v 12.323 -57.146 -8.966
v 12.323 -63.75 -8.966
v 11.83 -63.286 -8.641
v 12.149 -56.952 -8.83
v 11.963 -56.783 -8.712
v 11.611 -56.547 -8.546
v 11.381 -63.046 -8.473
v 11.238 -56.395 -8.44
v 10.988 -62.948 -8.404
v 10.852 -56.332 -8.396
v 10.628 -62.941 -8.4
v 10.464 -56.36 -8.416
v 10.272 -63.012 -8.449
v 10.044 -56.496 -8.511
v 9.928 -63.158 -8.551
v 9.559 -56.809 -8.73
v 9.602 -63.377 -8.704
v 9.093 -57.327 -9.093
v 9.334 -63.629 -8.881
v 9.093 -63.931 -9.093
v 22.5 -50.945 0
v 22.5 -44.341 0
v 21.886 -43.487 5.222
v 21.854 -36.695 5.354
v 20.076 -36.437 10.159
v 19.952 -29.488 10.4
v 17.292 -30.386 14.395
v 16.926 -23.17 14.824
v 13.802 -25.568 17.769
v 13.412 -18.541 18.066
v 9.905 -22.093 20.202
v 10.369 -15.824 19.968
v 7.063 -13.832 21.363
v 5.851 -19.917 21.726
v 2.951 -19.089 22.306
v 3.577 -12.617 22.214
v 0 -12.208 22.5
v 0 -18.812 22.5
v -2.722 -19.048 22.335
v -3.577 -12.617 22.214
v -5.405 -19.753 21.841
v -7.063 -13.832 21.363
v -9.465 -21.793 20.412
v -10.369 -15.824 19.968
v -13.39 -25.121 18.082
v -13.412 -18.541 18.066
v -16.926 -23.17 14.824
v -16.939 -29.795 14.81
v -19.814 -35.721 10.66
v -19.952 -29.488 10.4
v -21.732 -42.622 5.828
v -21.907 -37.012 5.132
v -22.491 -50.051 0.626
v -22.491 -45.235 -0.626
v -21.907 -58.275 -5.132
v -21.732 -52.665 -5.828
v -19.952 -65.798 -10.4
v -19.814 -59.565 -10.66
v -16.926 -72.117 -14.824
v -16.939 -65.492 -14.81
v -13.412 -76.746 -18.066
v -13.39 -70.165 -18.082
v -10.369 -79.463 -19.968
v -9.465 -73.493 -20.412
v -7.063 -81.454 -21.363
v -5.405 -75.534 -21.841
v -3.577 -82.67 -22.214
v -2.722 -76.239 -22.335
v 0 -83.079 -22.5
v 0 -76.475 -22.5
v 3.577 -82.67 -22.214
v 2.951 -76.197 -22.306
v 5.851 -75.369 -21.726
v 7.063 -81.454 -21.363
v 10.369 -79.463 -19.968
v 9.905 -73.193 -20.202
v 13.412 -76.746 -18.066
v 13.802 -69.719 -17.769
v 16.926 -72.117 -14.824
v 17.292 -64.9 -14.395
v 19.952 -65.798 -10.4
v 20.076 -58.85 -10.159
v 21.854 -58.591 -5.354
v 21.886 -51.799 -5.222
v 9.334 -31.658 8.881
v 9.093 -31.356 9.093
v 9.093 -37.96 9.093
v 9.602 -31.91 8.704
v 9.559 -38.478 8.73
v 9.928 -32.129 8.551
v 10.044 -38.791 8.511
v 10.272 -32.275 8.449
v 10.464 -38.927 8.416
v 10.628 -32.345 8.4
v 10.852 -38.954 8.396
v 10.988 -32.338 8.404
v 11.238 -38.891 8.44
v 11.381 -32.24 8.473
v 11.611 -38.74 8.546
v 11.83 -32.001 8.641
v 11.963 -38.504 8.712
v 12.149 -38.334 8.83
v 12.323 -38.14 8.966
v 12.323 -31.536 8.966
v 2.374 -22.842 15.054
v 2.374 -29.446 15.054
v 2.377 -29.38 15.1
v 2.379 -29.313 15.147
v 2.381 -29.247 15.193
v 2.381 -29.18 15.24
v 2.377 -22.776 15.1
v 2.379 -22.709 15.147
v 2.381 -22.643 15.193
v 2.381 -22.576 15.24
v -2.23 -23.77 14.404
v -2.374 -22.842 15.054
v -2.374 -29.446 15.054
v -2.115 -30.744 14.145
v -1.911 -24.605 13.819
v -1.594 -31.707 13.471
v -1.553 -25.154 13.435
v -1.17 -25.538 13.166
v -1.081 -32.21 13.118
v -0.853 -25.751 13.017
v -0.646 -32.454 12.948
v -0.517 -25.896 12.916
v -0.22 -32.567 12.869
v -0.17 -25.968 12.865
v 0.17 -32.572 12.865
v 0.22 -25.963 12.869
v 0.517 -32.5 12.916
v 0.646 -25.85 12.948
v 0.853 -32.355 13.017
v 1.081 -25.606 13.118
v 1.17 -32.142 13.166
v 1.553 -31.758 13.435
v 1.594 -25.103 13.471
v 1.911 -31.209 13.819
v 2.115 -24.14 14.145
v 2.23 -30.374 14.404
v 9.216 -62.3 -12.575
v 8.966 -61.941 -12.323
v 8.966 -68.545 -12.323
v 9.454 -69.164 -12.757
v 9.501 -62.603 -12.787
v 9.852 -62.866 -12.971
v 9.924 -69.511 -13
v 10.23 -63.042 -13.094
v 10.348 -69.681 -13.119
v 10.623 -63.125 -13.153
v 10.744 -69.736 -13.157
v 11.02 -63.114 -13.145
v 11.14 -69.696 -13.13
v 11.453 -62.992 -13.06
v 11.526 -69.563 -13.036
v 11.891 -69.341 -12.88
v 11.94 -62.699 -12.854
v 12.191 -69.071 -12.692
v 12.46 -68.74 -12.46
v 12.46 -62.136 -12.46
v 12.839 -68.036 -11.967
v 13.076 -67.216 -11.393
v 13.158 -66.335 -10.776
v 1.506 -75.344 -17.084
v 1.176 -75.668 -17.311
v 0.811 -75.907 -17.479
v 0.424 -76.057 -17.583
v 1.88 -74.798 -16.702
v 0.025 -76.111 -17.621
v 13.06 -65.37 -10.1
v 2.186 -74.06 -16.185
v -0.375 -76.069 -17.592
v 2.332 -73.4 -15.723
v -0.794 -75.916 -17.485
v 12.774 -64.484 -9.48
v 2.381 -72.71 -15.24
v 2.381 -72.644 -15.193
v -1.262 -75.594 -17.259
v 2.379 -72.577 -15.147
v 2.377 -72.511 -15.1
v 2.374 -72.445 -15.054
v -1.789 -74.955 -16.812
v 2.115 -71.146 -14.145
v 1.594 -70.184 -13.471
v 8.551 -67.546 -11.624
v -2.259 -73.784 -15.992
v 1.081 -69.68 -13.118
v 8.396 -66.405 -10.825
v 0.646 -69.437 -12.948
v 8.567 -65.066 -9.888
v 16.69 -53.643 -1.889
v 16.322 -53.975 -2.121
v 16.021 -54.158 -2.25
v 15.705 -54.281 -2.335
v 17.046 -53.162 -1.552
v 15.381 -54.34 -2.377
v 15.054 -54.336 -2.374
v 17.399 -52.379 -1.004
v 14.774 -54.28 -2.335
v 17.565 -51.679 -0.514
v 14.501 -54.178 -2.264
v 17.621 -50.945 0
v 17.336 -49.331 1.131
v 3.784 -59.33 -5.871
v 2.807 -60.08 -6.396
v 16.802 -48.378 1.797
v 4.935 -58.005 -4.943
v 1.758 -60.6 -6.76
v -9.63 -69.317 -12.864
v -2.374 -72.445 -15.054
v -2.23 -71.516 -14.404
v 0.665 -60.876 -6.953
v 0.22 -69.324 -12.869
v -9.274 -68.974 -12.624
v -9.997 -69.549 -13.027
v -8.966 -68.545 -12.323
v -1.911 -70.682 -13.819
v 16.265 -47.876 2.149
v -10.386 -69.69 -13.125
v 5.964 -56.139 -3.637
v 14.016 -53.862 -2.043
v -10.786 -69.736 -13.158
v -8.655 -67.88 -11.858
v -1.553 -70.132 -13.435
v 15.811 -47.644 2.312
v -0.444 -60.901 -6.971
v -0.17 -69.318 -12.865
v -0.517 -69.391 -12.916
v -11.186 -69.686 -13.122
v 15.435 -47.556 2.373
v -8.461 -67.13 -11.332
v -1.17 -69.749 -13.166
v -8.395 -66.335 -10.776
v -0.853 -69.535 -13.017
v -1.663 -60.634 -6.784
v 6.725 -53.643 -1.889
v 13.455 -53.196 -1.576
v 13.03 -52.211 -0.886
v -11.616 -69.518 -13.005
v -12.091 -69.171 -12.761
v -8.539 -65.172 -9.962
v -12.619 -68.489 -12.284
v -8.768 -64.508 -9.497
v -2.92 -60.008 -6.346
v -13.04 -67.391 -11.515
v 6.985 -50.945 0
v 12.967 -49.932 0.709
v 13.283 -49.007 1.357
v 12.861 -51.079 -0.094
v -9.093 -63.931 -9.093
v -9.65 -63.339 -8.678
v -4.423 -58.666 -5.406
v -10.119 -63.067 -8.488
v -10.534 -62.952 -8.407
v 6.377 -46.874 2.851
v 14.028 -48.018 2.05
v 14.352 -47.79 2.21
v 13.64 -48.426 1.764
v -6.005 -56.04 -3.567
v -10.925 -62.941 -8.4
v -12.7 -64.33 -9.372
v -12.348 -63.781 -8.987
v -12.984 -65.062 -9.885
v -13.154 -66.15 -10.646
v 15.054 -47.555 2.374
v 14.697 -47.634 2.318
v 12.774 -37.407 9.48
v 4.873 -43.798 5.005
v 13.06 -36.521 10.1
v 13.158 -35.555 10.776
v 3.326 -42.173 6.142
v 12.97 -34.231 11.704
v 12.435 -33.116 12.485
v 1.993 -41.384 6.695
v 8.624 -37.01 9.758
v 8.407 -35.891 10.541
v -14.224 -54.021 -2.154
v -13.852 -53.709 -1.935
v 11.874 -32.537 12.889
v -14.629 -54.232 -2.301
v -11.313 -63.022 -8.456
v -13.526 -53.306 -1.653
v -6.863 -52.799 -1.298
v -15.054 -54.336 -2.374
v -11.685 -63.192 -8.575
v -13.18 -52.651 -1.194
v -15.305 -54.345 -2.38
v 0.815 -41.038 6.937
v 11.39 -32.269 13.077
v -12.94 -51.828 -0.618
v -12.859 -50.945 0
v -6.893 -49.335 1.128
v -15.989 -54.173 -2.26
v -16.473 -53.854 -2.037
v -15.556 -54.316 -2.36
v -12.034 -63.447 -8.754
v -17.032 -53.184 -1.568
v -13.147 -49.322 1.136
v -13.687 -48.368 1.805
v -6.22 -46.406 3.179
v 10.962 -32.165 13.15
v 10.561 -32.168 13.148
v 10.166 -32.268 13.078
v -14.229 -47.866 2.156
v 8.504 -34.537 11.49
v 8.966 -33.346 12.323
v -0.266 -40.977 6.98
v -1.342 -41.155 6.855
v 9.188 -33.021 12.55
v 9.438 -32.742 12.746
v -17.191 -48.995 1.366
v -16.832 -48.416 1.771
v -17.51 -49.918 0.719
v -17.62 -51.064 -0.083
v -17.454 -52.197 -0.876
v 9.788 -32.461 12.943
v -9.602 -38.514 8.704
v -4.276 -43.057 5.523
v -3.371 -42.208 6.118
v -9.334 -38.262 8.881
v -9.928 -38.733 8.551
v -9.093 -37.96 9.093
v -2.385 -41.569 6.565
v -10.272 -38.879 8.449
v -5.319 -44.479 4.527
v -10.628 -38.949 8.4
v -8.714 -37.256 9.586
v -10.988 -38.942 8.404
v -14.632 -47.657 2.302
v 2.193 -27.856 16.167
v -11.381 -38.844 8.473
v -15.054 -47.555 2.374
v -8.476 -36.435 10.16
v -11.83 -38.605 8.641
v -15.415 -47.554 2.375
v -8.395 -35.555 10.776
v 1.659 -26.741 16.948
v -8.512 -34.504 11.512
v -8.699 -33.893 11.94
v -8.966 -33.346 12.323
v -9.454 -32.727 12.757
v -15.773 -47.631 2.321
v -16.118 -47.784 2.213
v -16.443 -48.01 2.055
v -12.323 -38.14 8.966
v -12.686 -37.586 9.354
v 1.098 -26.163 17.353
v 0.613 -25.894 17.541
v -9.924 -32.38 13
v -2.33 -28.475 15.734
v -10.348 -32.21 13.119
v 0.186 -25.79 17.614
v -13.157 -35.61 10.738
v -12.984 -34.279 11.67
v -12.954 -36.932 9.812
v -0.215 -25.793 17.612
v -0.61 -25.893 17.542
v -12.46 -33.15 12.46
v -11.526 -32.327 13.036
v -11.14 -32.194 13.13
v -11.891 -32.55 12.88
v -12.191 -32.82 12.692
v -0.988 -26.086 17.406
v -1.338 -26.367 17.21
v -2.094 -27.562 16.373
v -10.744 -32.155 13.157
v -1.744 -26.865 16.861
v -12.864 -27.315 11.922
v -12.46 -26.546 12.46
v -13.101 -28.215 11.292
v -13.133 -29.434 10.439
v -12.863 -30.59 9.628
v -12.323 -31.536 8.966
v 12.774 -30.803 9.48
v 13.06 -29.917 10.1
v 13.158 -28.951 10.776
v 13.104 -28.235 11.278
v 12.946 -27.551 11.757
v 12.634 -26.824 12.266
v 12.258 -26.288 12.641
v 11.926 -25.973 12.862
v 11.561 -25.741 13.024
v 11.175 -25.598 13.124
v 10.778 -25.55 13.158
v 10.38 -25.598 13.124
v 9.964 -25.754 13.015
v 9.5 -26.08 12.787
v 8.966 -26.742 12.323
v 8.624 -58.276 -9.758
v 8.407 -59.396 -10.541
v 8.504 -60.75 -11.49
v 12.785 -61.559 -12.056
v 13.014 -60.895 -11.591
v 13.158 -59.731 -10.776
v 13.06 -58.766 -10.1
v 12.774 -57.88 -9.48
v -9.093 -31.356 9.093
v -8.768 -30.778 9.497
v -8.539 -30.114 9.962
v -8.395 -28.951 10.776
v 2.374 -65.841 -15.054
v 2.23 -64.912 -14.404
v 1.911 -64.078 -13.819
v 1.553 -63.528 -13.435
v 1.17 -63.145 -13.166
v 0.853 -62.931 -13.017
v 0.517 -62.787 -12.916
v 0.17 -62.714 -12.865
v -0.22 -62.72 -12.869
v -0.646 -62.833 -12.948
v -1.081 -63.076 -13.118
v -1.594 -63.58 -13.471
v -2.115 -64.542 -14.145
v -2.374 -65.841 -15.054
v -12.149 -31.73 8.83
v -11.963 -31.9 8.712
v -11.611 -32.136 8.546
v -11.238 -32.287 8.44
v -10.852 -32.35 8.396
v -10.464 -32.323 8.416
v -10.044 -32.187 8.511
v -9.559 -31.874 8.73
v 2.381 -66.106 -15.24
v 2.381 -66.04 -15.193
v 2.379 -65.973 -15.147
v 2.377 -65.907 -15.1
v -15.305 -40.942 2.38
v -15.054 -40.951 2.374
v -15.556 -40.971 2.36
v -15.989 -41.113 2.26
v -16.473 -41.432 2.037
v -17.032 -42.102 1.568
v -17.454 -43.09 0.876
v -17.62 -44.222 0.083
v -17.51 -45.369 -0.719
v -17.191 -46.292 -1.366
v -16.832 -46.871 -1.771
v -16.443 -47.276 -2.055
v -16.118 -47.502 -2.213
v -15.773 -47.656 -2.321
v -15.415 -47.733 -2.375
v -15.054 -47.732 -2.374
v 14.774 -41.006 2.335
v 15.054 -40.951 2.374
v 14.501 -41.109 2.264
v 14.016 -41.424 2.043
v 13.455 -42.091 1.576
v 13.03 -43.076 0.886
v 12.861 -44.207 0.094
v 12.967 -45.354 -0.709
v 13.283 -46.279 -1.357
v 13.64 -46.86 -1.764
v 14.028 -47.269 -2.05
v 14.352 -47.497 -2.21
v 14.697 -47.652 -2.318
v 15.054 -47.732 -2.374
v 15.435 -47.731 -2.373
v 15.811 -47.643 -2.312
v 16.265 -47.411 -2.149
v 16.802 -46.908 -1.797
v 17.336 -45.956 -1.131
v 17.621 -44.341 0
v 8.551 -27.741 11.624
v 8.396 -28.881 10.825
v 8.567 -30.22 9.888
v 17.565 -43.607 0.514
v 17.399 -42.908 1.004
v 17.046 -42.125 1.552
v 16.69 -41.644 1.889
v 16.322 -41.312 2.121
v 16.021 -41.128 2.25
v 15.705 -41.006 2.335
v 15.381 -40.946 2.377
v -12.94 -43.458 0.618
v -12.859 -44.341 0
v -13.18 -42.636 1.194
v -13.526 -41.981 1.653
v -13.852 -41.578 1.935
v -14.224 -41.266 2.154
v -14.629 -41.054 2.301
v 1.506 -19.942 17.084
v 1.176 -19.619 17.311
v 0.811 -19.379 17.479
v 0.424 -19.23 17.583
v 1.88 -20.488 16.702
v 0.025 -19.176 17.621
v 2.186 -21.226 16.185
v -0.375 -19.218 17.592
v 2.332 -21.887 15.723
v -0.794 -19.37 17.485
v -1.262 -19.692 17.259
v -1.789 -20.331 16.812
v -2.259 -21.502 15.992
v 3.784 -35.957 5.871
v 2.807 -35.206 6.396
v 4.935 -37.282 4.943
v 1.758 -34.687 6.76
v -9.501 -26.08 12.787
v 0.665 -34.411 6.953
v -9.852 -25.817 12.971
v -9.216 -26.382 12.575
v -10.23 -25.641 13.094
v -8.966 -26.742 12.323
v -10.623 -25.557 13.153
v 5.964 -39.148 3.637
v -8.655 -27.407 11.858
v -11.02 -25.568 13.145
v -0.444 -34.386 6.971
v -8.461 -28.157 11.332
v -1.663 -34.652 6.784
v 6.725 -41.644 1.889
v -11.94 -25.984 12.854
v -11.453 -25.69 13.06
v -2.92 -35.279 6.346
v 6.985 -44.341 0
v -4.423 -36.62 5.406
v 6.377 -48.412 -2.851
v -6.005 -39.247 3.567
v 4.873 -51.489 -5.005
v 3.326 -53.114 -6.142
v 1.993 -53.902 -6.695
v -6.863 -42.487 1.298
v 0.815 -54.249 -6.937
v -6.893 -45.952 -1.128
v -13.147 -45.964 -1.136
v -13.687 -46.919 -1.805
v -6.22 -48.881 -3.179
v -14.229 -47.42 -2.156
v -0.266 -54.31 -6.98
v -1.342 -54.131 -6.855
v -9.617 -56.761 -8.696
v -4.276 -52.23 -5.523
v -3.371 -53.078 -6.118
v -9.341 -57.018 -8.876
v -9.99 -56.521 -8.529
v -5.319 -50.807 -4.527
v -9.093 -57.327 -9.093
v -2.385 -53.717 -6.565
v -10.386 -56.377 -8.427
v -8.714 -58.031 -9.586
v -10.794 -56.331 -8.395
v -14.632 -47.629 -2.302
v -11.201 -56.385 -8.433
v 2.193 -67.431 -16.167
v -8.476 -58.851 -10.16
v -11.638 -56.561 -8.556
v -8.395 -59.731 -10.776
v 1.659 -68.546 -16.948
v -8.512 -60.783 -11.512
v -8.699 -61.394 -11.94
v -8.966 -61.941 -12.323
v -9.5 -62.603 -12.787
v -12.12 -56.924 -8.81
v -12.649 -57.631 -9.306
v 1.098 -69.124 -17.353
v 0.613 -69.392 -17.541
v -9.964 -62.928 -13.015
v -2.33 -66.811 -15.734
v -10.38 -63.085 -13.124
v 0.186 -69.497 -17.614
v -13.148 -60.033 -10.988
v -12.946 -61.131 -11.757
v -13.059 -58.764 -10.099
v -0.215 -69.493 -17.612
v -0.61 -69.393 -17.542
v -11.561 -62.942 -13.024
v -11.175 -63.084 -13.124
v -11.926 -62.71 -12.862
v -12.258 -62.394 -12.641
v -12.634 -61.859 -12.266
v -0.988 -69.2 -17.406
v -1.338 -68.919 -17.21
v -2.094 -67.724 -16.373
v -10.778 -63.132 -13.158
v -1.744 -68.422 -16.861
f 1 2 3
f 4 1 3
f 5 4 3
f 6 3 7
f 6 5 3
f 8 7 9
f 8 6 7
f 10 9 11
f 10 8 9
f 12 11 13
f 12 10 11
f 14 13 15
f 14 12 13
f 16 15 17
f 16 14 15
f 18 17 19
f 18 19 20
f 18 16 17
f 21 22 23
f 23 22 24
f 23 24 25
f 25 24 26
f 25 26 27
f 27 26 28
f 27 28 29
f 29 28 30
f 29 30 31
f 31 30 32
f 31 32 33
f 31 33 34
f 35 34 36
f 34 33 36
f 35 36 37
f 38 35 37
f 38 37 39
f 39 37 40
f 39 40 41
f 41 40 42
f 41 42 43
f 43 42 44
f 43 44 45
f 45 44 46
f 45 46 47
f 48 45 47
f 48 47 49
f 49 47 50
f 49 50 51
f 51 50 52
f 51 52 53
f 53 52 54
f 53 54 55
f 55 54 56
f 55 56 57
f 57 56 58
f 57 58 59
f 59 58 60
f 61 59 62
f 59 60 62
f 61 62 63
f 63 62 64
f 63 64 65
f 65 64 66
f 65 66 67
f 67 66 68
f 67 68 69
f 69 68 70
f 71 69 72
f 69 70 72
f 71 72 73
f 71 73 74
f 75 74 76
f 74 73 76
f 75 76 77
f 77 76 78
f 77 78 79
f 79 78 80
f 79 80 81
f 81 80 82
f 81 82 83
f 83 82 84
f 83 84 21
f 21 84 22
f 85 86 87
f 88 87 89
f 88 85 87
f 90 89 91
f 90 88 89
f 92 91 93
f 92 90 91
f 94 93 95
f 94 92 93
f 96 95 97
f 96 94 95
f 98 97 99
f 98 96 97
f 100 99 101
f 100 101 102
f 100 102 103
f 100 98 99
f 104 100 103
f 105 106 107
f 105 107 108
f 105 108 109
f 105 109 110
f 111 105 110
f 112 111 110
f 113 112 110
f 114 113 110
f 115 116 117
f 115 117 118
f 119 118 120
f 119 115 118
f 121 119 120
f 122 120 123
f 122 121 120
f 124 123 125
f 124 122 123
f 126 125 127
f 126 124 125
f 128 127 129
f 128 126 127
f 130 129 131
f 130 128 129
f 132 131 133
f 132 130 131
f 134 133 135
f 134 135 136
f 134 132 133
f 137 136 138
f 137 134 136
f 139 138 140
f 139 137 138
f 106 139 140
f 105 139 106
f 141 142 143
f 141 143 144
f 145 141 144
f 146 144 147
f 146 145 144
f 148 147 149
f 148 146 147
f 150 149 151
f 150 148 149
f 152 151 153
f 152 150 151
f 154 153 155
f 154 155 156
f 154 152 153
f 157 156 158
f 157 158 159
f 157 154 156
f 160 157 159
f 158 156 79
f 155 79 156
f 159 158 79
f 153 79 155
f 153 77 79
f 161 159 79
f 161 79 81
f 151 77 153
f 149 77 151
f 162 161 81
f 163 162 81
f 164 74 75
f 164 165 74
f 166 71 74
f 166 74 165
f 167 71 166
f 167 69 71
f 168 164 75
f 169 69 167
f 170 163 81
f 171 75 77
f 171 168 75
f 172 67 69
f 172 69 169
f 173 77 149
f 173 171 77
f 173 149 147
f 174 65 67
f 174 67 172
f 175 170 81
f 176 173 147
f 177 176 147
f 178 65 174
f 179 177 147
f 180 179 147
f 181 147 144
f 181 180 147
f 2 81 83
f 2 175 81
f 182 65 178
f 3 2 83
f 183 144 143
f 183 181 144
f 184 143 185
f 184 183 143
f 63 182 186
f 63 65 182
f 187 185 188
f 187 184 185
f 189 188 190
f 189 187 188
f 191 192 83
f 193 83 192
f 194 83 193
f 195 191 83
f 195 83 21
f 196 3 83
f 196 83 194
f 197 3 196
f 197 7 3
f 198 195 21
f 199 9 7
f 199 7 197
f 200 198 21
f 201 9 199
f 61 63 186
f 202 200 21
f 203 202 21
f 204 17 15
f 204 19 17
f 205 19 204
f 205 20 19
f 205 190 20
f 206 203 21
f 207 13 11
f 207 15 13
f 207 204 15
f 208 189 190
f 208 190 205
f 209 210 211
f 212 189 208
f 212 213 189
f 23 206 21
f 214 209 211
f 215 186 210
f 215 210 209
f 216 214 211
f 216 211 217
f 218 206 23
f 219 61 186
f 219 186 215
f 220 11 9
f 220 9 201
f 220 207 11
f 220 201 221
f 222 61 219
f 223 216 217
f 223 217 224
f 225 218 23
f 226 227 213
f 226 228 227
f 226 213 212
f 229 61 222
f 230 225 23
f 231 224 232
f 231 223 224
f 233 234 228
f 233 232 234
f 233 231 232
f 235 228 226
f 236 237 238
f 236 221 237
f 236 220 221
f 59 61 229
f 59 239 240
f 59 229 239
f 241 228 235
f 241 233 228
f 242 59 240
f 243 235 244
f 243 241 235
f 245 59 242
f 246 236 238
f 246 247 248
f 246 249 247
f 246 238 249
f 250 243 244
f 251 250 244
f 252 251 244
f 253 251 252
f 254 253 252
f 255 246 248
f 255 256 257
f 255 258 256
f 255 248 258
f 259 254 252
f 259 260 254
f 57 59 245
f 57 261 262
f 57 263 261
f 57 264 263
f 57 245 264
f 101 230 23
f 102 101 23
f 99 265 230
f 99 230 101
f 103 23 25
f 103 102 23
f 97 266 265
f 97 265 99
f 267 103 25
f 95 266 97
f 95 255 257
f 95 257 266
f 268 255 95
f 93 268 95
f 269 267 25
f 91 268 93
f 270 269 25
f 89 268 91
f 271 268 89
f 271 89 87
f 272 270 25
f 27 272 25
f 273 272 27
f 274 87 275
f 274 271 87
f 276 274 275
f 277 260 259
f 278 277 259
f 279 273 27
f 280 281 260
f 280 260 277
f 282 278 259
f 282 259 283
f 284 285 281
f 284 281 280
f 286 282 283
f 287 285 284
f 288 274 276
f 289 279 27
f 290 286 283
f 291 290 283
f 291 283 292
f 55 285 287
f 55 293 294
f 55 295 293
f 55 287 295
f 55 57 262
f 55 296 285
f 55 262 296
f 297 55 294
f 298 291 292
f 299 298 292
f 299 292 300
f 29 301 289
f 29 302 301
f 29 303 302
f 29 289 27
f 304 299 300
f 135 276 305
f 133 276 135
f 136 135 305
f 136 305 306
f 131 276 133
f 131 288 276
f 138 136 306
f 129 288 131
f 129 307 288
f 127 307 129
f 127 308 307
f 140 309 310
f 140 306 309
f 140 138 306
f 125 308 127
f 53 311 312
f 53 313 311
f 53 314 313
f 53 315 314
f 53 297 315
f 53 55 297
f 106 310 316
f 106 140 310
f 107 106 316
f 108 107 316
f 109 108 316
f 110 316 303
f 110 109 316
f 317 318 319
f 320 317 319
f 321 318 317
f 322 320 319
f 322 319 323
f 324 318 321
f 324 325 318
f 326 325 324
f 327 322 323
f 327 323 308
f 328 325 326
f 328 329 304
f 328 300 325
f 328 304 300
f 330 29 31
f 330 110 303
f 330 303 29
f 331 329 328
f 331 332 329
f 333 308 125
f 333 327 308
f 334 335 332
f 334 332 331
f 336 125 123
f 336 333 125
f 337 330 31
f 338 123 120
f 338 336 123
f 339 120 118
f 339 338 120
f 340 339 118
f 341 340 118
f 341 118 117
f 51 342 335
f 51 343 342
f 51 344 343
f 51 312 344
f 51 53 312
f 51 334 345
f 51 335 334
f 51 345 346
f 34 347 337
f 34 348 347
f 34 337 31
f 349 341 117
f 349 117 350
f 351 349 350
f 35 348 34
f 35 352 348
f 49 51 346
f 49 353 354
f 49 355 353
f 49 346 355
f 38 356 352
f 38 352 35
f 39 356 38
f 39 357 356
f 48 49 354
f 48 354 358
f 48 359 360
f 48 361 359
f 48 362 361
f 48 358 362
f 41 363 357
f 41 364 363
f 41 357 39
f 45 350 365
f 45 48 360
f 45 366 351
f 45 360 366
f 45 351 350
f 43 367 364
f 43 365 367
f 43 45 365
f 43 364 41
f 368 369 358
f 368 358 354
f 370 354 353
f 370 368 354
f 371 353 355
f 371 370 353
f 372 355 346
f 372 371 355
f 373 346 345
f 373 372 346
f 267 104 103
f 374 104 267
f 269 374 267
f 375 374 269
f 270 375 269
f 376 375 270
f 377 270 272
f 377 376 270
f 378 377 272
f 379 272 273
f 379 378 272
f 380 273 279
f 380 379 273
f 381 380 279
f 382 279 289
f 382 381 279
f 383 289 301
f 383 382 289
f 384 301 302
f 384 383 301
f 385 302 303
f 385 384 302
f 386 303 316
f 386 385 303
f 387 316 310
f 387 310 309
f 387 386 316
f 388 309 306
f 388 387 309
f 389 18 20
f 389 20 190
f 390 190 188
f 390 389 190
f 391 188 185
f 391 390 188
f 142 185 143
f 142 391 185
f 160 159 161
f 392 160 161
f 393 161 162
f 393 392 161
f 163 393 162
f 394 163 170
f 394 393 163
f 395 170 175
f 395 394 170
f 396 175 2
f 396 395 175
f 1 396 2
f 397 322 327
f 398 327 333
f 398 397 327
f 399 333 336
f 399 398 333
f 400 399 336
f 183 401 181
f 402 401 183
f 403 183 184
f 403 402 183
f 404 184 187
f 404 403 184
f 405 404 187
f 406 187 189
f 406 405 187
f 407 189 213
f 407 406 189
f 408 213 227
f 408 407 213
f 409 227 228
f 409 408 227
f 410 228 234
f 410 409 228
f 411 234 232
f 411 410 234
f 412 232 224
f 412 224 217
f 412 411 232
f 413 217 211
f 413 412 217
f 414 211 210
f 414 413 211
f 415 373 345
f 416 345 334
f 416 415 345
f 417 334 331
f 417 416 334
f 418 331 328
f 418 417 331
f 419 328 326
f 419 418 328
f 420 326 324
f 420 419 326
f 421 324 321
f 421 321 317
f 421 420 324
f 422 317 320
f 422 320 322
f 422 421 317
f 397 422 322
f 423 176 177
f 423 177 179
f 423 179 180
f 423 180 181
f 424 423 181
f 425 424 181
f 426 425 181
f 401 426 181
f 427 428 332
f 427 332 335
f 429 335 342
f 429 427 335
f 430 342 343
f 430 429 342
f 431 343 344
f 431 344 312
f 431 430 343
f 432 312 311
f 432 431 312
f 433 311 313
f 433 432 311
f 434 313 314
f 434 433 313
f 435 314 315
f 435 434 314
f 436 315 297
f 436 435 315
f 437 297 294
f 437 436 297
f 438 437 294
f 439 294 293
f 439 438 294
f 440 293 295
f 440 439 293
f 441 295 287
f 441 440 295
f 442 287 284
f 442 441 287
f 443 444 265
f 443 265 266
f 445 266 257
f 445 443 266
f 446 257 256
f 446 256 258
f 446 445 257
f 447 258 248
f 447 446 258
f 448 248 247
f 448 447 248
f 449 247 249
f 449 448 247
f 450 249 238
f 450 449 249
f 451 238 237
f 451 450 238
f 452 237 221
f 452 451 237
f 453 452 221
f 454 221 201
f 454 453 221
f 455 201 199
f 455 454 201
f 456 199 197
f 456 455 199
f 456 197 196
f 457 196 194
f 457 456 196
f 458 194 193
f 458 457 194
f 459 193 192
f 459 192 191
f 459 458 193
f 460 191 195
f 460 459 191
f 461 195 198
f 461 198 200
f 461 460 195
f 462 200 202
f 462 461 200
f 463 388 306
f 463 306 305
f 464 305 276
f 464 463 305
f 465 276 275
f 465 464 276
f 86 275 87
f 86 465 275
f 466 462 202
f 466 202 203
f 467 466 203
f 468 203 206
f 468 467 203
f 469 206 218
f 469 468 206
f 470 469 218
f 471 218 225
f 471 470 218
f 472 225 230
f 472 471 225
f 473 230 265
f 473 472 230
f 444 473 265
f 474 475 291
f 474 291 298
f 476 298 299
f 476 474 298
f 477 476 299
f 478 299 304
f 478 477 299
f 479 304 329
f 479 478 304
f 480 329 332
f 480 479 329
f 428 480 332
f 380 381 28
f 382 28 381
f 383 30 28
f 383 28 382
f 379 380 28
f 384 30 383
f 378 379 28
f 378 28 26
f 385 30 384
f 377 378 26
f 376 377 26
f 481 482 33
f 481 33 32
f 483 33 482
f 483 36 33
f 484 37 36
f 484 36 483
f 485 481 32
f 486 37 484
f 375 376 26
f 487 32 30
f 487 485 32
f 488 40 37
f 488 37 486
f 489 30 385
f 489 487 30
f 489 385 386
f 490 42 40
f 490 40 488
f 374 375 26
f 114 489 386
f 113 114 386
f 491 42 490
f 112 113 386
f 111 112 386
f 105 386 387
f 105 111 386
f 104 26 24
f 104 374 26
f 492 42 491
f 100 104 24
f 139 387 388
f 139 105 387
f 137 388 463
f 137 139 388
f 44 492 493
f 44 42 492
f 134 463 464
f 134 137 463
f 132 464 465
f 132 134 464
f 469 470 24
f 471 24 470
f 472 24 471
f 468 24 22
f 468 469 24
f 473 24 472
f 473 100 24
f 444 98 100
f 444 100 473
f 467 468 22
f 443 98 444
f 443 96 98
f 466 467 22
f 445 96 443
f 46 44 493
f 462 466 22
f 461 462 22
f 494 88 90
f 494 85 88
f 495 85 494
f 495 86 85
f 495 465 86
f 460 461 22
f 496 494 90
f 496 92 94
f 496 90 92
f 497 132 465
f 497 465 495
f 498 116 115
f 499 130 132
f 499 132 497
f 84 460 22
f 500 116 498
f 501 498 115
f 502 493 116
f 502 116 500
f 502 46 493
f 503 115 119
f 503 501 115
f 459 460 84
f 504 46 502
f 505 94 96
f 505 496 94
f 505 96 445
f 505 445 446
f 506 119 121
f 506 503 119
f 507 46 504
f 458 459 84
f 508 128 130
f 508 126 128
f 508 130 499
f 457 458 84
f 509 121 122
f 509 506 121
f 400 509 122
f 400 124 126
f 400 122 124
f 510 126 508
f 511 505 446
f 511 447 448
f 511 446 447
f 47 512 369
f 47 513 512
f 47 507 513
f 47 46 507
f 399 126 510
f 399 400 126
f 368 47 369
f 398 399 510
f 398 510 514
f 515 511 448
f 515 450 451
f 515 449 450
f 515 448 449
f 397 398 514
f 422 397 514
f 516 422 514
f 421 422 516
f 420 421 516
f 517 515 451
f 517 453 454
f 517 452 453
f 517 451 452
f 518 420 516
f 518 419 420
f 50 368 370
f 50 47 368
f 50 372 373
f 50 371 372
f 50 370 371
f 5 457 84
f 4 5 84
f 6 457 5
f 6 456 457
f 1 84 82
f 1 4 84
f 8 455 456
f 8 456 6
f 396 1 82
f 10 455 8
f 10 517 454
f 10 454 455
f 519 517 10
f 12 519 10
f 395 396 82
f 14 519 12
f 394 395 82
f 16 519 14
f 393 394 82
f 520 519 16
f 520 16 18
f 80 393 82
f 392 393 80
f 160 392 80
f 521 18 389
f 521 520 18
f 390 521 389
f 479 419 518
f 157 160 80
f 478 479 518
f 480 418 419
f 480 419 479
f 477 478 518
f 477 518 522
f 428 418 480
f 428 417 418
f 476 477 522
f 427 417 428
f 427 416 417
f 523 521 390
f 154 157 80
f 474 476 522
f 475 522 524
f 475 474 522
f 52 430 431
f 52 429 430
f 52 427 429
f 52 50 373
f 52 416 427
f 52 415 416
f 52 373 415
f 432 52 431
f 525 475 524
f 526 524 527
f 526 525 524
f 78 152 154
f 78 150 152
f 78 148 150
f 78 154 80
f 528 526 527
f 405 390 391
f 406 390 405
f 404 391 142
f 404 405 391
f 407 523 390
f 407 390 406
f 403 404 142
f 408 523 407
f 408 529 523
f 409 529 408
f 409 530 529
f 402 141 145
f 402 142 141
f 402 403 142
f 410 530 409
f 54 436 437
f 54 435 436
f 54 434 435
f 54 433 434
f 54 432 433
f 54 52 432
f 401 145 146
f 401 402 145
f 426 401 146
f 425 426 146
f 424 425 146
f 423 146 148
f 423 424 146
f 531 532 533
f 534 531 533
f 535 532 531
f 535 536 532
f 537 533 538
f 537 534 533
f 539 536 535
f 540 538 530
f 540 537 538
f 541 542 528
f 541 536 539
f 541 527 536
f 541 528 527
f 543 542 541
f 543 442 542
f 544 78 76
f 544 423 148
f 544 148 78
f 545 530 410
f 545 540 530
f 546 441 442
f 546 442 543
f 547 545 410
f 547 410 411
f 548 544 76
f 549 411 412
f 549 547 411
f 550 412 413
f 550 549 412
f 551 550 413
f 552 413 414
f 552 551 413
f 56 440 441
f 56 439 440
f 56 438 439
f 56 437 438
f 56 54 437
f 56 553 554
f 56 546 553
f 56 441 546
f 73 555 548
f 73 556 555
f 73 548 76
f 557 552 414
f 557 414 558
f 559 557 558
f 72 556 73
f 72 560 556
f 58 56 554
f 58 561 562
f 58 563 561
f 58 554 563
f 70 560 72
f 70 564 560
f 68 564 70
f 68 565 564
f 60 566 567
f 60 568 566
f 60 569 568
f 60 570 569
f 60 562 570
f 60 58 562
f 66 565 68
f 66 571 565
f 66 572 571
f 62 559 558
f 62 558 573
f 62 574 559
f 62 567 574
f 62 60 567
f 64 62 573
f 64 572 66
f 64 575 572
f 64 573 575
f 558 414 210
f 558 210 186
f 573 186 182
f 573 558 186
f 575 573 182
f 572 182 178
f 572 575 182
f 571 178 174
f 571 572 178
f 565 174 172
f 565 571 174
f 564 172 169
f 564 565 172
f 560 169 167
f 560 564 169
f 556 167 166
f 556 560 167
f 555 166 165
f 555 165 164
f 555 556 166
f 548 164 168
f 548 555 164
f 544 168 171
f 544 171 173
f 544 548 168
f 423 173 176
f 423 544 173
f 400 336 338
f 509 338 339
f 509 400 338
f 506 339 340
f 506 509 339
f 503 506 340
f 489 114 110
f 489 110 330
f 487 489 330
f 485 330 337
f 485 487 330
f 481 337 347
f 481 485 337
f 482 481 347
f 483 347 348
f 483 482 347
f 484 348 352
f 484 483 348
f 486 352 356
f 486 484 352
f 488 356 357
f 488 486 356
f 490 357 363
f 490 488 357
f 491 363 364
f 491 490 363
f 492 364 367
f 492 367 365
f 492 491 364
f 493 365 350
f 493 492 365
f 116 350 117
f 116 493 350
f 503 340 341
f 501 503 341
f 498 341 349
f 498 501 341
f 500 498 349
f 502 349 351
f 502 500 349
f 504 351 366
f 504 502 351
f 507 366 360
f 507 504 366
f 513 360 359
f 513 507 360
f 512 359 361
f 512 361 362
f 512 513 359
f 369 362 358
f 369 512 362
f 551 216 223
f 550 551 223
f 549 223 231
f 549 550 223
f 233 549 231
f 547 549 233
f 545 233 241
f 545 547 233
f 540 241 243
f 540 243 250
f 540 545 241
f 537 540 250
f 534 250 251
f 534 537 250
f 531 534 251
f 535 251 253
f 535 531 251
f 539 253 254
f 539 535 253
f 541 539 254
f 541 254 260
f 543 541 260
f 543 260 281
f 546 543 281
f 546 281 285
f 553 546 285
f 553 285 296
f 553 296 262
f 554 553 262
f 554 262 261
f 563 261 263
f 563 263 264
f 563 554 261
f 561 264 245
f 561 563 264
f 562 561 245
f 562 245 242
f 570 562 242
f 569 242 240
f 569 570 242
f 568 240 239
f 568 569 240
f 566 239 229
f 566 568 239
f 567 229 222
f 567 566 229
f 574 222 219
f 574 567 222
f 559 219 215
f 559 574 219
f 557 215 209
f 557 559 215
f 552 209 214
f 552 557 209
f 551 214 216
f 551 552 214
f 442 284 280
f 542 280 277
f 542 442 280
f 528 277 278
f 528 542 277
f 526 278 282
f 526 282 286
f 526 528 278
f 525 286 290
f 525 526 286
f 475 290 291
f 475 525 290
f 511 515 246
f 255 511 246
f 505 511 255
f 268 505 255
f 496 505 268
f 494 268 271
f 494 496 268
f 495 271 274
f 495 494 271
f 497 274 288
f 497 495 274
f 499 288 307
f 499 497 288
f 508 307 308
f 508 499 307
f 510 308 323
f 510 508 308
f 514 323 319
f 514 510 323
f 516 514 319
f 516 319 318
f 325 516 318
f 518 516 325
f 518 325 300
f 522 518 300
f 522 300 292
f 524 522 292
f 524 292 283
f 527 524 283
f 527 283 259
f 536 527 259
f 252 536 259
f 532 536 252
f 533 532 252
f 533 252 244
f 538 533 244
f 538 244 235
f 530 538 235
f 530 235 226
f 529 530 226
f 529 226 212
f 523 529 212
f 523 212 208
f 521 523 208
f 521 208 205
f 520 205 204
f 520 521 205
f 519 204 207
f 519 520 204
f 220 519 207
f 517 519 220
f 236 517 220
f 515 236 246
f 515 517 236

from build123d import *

# Parameters (mm, degrees)
F0_R          = 22.5
F1_DEPTH      = 101.6
F3_DEPTH      = 22.501
F3_DEPTH_BACK = 22.501
F4_DEPTH      = 22.501
F4_DEPTH_BACK = 22.501
F6_DEPTH      = 83.079608795
F7_R          = 2.38125
F8_DEPTH      = 83.079608795
F9_R          = 2.38125
F9_R_2        = 6.985
F10_DEPTH     = 83.079608795


with BuildPart() as f1:
    # F0 (on Front) → F1 (new body)
    with BuildSketch(Plane.XZ):
        Circle(F0_R)
    extrude(amount=F1_DEPTH)

    # F2 (on Right) → F3 (cut, two sides)
    with BuildSketch(Plane.YZ) as f3_sk:
        Polygon((-106.5287748777, -38.457716324), (-83.0848926463, -22.5044), (-18.8056646404, 22.5044), (-103.6715880036, 26.2515861541), align=None)
    extrude(amount=-F3_DEPTH, mode=Mode.SUBTRACT)
    extrude(f3_sk.sketch, amount=F3_DEPTH_BACK, mode=Mode.SUBTRACT)

    # F2 (on Right) → F4 (cut, two sides)
    with BuildSketch(Plane.YZ) as f4_sk:
        Polygon((-12.2079484916, 22.5), (-76.4808926463, -22.5044), (27.3525305092, -35.9458737075), (27.3525305092, 27.8113950044), align=None)
    extrude(amount=-F4_DEPTH, mode=Mode.SUBTRACT)
    extrude(f4_sk.sketch, amount=F4_DEPTH_BACK, mode=Mode.SUBTRACT)

    # F5 (on Front) → F6 (cut, through all)
    with BuildSketch(Plane.XZ):
        with BuildLine():
            ThreePointArc((8.9661090106, -12.3234122389), (9.901471319, -11.5852693417), (10.7763073453, -10.7763073453))
            Line((10.7763073453, -10.7763073453), (9.0925093226, -9.0925093226))
            ThreePointArc((9.0925093226, -9.0925093226), (8.3968775712, -10.6832186102), (8.9661090106, -12.3234122389))
        make_face()
        with BuildLine():
            ThreePointArc((10.7763073453, -10.7763073453), (11.5852693417, -9.901471319), (12.3234122389, -8.9661090106))
            ThreePointArc((12.3234122389, -8.9661090106), (10.6832186102, -8.3968775712), (9.0925093226, -9.0925093226))
            Line((9.0925093226, -9.0925093226), (10.7763073453, -10.7763073453))
        make_face()
        with BuildLine():
            Line((12.460105368, -12.460105368), (10.7763073453, -10.7763073453))
            ThreePointArc((10.7763073453, -10.7763073453), (9.901471319, -11.5852693417), (8.9661090106, -12.3234122389))
            ThreePointArc((8.9661090106, -12.3234122389), (10.6832186102, -13.1557371194), (12.460105368, -12.460105368))
        make_face()
        with BuildLine():
            ThreePointArc((15.0539648438, -2.3739718792), (15.1934200268, -1.190625), (15.24, 0))
            ThreePointArc((15.24, 0), (15.1934200268, 1.190625), (15.0539648438, 2.3739718792))
            ThreePointArc((15.0539648438, 2.3739718792), (12.85875, 0), (15.0539648438, -2.3739718792))
        make_face()
        with BuildLine():
            ThreePointArc((15.0539648438, 2.3739718792), (15.1934200268, 1.190625), (15.24, 0))
            ThreePointArc((15.24, 0), (15.1934200268, -1.190625), (15.0539648438, -2.3739718792))
            ThreePointArc((15.0539648438, -2.3739718792), (16.8566872528, -1.7483346045), (17.62125, 0))
            ThreePointArc((17.62125, 0), (16.8566872528, 1.7483346045), (15.0539648438, 2.3739718792))
        make_face()
        with BuildLine():
            ThreePointArc((-2.3739718792, 15.0539648438), (0, 15.24), (2.3739718792, 15.0539648438))
            ThreePointArc((2.3739718792, 15.0539648437), (2.3794297741, 15.1469112649), (2.38125, 15.24))
            ThreePointArc((2.38125, 15.24), (-0.0930887351, 17.6194297741), (-2.3739718792, 15.0539648438))
        make_face()
        with BuildLine():
            ThreePointArc((-2.3739718792, 15.0539648438), (0, 12.85875), (2.3739718792, 15.0539648437))
            ThreePointArc((2.3739718792, 15.0539648438), (0, 15.24), (-2.3739718792, 15.0539648438))
        make_face()
        with BuildLine():
            ThreePointArc((2.38125, -15.24), (2.3794297741, -15.1469112649), (2.3739718792, -15.0539648437))
            ThreePointArc((2.3739718792, -15.0539648438), (0, -15.24), (-2.3739718792, -15.0539648438))
            ThreePointArc((-2.3739718792, -15.0539648438), (-0.0930887351, -17.6194297741), (2.38125, -15.24))
        make_face()
        with BuildLine():
            ThreePointArc((-12.3234122389, 8.9661090106), (-10.6832186102, 8.3968775712), (-9.0925093226, 9.0925093226))
            Line((-9.0925093226, 9.0925093226), (-10.7763073453, 10.7763073453))
            ThreePointArc((-10.7763073453, 10.7763073453), (-11.5852693417, 9.901471319), (-12.3234122389, 8.9661090106))
        make_face()
        with BuildLine():
            ThreePointArc((-12.3234122389, 8.9661090106), (-11.5852693417, 9.901471319), (-10.7763073453, 10.7763073453))
            Line((-10.7763073453, 10.7763073453), (-12.460105368, 12.460105368))
            ThreePointArc((-12.460105368, 12.460105368), (-13.1557371194, 10.6832186102), (-12.3234122389, 8.9661090106))
        make_face()
        with BuildLine():
            ThreePointArc((-8.3950573453, -10.7763073453), (-8.5763192085, -9.865042422), (-9.0925093226, -9.0925093226))
            Line((-9.0925093226, -9.0925093226), (-10.7763073453, -10.7763073453))
            ThreePointArc((-10.7763073453, -10.7763073453), (-9.901471319, -11.5852693417), (-8.9661090106, -12.3234122389))
            ThreePointArc((-8.9661090106, -12.3234122389), (-8.5423773613, -11.6008729213), (-8.3950573453, -10.7763073453))
        make_face()
        with BuildLine():
            ThreePointArc((-15.24, 0), (-15.1934200268, 1.190625), (-15.0539648438, 2.3739718792))
            ThreePointArc((-15.0539648438, 2.3739718792), (-17.62125, 0), (-15.0539648438, -2.3739718792))
            ThreePointArc((-15.0539648438, -2.3739718792), (-15.1934200268, -1.190625), (-15.24, 0))
        make_face()
        with BuildLine():
            ThreePointArc((9.0925093226, 9.0925093226), (10.6832186102, 8.3968775712), (12.3234122389, 8.9661090106))
            ThreePointArc((12.3234122389, 8.9661090106), (11.5852693417, 9.901471319), (10.7763073453, 10.7763073453))
            Line((10.7763073453, 10.7763073453), (9.0925093226, 9.0925093226))
        make_face()
        with BuildLine():
            ThreePointArc((-15.0539648438, -2.3739718792), (-13.4916653955, -1.6166872528), (-12.85875, 0))
            Line((-12.85875, 0), (-15.24, 0))
            ThreePointArc((-15.24, 0), (-15.1934200268, -1.190625), (-15.0539648438, -2.3739718792))
        make_face()
        with BuildLine():
            Line((-15.24, 0), (-12.85875, 0))
            ThreePointArc((-12.85875, 0), (-13.4916653955, 1.6166872528), (-15.0539648438, 2.3739718792))
            ThreePointArc((-15.0539648438, 2.3739718792), (-15.1934200268, 1.190625), (-15.24, 0))
        make_face()
        with BuildLine():
            Line((-10.7763073453, 10.7763073453), (-9.0925093226, 9.0925093226))
            ThreePointArc((-9.0925093226, 9.0925093226), (-8.5763192085, 9.865042422), (-8.3950573453, 10.7763073453))
            ThreePointArc((-8.3950573453, 10.7763073453), (-8.5423773613, 11.6008729213), (-8.9661090106, 12.3234122389))
            ThreePointArc((-8.9661090106, 12.3234122389), (-9.901471319, 11.5852693417), (-10.7763073453, 10.7763073453))
        make_face()
        with BuildLine():
            Line((9.0925093226, 9.0925093226), (10.7763073453, 10.7763073453))
            ThreePointArc((10.7763073453, 10.7763073453), (9.901471319, 11.5852693417), (8.9661090106, 12.3234122389))
            ThreePointArc((8.9661090106, 12.3234122389), (8.3968775712, 10.6832186102), (9.0925093226, 9.0925093226))
        make_face()
        with BuildLine():
            ThreePointArc((-2.3739718792, -15.0539648438), (0, -15.24), (2.3739718792, -15.0539648438))
            ThreePointArc((2.3739718792, -15.0539648437), (0, -12.85875), (-2.3739718792, -15.0539648438))
        make_face()
    extrude(amount=F6_DEPTH, mode=Mode.SUBTRACT)

    # F7 (on Front) → F8 (cut, through all)
    with BuildSketch(Plane.XZ):
        with Locations((10.7763073453, 10.7763073453)):
            Circle(F7_R)
    extrude(amount=F8_DEPTH, mode=Mode.SUBTRACT)

    # F9 (on Front) → F10 (cut, through all)
    with BuildSketch(Plane.XZ):
        with Locations((10.7763073453, -10.7763073453)):
            Circle(F9_R)
        with Locations((-10.7763073453, -10.7763073453)):
            Circle(F9_R)
        with Locations((-10.7763073453, 10.7763073453)):
            Circle(F9_R)
        Circle(F9_R_2)
    extrude(amount=F10_DEPTH, mode=Mode.SUBTRACT)


solid = f1.part
